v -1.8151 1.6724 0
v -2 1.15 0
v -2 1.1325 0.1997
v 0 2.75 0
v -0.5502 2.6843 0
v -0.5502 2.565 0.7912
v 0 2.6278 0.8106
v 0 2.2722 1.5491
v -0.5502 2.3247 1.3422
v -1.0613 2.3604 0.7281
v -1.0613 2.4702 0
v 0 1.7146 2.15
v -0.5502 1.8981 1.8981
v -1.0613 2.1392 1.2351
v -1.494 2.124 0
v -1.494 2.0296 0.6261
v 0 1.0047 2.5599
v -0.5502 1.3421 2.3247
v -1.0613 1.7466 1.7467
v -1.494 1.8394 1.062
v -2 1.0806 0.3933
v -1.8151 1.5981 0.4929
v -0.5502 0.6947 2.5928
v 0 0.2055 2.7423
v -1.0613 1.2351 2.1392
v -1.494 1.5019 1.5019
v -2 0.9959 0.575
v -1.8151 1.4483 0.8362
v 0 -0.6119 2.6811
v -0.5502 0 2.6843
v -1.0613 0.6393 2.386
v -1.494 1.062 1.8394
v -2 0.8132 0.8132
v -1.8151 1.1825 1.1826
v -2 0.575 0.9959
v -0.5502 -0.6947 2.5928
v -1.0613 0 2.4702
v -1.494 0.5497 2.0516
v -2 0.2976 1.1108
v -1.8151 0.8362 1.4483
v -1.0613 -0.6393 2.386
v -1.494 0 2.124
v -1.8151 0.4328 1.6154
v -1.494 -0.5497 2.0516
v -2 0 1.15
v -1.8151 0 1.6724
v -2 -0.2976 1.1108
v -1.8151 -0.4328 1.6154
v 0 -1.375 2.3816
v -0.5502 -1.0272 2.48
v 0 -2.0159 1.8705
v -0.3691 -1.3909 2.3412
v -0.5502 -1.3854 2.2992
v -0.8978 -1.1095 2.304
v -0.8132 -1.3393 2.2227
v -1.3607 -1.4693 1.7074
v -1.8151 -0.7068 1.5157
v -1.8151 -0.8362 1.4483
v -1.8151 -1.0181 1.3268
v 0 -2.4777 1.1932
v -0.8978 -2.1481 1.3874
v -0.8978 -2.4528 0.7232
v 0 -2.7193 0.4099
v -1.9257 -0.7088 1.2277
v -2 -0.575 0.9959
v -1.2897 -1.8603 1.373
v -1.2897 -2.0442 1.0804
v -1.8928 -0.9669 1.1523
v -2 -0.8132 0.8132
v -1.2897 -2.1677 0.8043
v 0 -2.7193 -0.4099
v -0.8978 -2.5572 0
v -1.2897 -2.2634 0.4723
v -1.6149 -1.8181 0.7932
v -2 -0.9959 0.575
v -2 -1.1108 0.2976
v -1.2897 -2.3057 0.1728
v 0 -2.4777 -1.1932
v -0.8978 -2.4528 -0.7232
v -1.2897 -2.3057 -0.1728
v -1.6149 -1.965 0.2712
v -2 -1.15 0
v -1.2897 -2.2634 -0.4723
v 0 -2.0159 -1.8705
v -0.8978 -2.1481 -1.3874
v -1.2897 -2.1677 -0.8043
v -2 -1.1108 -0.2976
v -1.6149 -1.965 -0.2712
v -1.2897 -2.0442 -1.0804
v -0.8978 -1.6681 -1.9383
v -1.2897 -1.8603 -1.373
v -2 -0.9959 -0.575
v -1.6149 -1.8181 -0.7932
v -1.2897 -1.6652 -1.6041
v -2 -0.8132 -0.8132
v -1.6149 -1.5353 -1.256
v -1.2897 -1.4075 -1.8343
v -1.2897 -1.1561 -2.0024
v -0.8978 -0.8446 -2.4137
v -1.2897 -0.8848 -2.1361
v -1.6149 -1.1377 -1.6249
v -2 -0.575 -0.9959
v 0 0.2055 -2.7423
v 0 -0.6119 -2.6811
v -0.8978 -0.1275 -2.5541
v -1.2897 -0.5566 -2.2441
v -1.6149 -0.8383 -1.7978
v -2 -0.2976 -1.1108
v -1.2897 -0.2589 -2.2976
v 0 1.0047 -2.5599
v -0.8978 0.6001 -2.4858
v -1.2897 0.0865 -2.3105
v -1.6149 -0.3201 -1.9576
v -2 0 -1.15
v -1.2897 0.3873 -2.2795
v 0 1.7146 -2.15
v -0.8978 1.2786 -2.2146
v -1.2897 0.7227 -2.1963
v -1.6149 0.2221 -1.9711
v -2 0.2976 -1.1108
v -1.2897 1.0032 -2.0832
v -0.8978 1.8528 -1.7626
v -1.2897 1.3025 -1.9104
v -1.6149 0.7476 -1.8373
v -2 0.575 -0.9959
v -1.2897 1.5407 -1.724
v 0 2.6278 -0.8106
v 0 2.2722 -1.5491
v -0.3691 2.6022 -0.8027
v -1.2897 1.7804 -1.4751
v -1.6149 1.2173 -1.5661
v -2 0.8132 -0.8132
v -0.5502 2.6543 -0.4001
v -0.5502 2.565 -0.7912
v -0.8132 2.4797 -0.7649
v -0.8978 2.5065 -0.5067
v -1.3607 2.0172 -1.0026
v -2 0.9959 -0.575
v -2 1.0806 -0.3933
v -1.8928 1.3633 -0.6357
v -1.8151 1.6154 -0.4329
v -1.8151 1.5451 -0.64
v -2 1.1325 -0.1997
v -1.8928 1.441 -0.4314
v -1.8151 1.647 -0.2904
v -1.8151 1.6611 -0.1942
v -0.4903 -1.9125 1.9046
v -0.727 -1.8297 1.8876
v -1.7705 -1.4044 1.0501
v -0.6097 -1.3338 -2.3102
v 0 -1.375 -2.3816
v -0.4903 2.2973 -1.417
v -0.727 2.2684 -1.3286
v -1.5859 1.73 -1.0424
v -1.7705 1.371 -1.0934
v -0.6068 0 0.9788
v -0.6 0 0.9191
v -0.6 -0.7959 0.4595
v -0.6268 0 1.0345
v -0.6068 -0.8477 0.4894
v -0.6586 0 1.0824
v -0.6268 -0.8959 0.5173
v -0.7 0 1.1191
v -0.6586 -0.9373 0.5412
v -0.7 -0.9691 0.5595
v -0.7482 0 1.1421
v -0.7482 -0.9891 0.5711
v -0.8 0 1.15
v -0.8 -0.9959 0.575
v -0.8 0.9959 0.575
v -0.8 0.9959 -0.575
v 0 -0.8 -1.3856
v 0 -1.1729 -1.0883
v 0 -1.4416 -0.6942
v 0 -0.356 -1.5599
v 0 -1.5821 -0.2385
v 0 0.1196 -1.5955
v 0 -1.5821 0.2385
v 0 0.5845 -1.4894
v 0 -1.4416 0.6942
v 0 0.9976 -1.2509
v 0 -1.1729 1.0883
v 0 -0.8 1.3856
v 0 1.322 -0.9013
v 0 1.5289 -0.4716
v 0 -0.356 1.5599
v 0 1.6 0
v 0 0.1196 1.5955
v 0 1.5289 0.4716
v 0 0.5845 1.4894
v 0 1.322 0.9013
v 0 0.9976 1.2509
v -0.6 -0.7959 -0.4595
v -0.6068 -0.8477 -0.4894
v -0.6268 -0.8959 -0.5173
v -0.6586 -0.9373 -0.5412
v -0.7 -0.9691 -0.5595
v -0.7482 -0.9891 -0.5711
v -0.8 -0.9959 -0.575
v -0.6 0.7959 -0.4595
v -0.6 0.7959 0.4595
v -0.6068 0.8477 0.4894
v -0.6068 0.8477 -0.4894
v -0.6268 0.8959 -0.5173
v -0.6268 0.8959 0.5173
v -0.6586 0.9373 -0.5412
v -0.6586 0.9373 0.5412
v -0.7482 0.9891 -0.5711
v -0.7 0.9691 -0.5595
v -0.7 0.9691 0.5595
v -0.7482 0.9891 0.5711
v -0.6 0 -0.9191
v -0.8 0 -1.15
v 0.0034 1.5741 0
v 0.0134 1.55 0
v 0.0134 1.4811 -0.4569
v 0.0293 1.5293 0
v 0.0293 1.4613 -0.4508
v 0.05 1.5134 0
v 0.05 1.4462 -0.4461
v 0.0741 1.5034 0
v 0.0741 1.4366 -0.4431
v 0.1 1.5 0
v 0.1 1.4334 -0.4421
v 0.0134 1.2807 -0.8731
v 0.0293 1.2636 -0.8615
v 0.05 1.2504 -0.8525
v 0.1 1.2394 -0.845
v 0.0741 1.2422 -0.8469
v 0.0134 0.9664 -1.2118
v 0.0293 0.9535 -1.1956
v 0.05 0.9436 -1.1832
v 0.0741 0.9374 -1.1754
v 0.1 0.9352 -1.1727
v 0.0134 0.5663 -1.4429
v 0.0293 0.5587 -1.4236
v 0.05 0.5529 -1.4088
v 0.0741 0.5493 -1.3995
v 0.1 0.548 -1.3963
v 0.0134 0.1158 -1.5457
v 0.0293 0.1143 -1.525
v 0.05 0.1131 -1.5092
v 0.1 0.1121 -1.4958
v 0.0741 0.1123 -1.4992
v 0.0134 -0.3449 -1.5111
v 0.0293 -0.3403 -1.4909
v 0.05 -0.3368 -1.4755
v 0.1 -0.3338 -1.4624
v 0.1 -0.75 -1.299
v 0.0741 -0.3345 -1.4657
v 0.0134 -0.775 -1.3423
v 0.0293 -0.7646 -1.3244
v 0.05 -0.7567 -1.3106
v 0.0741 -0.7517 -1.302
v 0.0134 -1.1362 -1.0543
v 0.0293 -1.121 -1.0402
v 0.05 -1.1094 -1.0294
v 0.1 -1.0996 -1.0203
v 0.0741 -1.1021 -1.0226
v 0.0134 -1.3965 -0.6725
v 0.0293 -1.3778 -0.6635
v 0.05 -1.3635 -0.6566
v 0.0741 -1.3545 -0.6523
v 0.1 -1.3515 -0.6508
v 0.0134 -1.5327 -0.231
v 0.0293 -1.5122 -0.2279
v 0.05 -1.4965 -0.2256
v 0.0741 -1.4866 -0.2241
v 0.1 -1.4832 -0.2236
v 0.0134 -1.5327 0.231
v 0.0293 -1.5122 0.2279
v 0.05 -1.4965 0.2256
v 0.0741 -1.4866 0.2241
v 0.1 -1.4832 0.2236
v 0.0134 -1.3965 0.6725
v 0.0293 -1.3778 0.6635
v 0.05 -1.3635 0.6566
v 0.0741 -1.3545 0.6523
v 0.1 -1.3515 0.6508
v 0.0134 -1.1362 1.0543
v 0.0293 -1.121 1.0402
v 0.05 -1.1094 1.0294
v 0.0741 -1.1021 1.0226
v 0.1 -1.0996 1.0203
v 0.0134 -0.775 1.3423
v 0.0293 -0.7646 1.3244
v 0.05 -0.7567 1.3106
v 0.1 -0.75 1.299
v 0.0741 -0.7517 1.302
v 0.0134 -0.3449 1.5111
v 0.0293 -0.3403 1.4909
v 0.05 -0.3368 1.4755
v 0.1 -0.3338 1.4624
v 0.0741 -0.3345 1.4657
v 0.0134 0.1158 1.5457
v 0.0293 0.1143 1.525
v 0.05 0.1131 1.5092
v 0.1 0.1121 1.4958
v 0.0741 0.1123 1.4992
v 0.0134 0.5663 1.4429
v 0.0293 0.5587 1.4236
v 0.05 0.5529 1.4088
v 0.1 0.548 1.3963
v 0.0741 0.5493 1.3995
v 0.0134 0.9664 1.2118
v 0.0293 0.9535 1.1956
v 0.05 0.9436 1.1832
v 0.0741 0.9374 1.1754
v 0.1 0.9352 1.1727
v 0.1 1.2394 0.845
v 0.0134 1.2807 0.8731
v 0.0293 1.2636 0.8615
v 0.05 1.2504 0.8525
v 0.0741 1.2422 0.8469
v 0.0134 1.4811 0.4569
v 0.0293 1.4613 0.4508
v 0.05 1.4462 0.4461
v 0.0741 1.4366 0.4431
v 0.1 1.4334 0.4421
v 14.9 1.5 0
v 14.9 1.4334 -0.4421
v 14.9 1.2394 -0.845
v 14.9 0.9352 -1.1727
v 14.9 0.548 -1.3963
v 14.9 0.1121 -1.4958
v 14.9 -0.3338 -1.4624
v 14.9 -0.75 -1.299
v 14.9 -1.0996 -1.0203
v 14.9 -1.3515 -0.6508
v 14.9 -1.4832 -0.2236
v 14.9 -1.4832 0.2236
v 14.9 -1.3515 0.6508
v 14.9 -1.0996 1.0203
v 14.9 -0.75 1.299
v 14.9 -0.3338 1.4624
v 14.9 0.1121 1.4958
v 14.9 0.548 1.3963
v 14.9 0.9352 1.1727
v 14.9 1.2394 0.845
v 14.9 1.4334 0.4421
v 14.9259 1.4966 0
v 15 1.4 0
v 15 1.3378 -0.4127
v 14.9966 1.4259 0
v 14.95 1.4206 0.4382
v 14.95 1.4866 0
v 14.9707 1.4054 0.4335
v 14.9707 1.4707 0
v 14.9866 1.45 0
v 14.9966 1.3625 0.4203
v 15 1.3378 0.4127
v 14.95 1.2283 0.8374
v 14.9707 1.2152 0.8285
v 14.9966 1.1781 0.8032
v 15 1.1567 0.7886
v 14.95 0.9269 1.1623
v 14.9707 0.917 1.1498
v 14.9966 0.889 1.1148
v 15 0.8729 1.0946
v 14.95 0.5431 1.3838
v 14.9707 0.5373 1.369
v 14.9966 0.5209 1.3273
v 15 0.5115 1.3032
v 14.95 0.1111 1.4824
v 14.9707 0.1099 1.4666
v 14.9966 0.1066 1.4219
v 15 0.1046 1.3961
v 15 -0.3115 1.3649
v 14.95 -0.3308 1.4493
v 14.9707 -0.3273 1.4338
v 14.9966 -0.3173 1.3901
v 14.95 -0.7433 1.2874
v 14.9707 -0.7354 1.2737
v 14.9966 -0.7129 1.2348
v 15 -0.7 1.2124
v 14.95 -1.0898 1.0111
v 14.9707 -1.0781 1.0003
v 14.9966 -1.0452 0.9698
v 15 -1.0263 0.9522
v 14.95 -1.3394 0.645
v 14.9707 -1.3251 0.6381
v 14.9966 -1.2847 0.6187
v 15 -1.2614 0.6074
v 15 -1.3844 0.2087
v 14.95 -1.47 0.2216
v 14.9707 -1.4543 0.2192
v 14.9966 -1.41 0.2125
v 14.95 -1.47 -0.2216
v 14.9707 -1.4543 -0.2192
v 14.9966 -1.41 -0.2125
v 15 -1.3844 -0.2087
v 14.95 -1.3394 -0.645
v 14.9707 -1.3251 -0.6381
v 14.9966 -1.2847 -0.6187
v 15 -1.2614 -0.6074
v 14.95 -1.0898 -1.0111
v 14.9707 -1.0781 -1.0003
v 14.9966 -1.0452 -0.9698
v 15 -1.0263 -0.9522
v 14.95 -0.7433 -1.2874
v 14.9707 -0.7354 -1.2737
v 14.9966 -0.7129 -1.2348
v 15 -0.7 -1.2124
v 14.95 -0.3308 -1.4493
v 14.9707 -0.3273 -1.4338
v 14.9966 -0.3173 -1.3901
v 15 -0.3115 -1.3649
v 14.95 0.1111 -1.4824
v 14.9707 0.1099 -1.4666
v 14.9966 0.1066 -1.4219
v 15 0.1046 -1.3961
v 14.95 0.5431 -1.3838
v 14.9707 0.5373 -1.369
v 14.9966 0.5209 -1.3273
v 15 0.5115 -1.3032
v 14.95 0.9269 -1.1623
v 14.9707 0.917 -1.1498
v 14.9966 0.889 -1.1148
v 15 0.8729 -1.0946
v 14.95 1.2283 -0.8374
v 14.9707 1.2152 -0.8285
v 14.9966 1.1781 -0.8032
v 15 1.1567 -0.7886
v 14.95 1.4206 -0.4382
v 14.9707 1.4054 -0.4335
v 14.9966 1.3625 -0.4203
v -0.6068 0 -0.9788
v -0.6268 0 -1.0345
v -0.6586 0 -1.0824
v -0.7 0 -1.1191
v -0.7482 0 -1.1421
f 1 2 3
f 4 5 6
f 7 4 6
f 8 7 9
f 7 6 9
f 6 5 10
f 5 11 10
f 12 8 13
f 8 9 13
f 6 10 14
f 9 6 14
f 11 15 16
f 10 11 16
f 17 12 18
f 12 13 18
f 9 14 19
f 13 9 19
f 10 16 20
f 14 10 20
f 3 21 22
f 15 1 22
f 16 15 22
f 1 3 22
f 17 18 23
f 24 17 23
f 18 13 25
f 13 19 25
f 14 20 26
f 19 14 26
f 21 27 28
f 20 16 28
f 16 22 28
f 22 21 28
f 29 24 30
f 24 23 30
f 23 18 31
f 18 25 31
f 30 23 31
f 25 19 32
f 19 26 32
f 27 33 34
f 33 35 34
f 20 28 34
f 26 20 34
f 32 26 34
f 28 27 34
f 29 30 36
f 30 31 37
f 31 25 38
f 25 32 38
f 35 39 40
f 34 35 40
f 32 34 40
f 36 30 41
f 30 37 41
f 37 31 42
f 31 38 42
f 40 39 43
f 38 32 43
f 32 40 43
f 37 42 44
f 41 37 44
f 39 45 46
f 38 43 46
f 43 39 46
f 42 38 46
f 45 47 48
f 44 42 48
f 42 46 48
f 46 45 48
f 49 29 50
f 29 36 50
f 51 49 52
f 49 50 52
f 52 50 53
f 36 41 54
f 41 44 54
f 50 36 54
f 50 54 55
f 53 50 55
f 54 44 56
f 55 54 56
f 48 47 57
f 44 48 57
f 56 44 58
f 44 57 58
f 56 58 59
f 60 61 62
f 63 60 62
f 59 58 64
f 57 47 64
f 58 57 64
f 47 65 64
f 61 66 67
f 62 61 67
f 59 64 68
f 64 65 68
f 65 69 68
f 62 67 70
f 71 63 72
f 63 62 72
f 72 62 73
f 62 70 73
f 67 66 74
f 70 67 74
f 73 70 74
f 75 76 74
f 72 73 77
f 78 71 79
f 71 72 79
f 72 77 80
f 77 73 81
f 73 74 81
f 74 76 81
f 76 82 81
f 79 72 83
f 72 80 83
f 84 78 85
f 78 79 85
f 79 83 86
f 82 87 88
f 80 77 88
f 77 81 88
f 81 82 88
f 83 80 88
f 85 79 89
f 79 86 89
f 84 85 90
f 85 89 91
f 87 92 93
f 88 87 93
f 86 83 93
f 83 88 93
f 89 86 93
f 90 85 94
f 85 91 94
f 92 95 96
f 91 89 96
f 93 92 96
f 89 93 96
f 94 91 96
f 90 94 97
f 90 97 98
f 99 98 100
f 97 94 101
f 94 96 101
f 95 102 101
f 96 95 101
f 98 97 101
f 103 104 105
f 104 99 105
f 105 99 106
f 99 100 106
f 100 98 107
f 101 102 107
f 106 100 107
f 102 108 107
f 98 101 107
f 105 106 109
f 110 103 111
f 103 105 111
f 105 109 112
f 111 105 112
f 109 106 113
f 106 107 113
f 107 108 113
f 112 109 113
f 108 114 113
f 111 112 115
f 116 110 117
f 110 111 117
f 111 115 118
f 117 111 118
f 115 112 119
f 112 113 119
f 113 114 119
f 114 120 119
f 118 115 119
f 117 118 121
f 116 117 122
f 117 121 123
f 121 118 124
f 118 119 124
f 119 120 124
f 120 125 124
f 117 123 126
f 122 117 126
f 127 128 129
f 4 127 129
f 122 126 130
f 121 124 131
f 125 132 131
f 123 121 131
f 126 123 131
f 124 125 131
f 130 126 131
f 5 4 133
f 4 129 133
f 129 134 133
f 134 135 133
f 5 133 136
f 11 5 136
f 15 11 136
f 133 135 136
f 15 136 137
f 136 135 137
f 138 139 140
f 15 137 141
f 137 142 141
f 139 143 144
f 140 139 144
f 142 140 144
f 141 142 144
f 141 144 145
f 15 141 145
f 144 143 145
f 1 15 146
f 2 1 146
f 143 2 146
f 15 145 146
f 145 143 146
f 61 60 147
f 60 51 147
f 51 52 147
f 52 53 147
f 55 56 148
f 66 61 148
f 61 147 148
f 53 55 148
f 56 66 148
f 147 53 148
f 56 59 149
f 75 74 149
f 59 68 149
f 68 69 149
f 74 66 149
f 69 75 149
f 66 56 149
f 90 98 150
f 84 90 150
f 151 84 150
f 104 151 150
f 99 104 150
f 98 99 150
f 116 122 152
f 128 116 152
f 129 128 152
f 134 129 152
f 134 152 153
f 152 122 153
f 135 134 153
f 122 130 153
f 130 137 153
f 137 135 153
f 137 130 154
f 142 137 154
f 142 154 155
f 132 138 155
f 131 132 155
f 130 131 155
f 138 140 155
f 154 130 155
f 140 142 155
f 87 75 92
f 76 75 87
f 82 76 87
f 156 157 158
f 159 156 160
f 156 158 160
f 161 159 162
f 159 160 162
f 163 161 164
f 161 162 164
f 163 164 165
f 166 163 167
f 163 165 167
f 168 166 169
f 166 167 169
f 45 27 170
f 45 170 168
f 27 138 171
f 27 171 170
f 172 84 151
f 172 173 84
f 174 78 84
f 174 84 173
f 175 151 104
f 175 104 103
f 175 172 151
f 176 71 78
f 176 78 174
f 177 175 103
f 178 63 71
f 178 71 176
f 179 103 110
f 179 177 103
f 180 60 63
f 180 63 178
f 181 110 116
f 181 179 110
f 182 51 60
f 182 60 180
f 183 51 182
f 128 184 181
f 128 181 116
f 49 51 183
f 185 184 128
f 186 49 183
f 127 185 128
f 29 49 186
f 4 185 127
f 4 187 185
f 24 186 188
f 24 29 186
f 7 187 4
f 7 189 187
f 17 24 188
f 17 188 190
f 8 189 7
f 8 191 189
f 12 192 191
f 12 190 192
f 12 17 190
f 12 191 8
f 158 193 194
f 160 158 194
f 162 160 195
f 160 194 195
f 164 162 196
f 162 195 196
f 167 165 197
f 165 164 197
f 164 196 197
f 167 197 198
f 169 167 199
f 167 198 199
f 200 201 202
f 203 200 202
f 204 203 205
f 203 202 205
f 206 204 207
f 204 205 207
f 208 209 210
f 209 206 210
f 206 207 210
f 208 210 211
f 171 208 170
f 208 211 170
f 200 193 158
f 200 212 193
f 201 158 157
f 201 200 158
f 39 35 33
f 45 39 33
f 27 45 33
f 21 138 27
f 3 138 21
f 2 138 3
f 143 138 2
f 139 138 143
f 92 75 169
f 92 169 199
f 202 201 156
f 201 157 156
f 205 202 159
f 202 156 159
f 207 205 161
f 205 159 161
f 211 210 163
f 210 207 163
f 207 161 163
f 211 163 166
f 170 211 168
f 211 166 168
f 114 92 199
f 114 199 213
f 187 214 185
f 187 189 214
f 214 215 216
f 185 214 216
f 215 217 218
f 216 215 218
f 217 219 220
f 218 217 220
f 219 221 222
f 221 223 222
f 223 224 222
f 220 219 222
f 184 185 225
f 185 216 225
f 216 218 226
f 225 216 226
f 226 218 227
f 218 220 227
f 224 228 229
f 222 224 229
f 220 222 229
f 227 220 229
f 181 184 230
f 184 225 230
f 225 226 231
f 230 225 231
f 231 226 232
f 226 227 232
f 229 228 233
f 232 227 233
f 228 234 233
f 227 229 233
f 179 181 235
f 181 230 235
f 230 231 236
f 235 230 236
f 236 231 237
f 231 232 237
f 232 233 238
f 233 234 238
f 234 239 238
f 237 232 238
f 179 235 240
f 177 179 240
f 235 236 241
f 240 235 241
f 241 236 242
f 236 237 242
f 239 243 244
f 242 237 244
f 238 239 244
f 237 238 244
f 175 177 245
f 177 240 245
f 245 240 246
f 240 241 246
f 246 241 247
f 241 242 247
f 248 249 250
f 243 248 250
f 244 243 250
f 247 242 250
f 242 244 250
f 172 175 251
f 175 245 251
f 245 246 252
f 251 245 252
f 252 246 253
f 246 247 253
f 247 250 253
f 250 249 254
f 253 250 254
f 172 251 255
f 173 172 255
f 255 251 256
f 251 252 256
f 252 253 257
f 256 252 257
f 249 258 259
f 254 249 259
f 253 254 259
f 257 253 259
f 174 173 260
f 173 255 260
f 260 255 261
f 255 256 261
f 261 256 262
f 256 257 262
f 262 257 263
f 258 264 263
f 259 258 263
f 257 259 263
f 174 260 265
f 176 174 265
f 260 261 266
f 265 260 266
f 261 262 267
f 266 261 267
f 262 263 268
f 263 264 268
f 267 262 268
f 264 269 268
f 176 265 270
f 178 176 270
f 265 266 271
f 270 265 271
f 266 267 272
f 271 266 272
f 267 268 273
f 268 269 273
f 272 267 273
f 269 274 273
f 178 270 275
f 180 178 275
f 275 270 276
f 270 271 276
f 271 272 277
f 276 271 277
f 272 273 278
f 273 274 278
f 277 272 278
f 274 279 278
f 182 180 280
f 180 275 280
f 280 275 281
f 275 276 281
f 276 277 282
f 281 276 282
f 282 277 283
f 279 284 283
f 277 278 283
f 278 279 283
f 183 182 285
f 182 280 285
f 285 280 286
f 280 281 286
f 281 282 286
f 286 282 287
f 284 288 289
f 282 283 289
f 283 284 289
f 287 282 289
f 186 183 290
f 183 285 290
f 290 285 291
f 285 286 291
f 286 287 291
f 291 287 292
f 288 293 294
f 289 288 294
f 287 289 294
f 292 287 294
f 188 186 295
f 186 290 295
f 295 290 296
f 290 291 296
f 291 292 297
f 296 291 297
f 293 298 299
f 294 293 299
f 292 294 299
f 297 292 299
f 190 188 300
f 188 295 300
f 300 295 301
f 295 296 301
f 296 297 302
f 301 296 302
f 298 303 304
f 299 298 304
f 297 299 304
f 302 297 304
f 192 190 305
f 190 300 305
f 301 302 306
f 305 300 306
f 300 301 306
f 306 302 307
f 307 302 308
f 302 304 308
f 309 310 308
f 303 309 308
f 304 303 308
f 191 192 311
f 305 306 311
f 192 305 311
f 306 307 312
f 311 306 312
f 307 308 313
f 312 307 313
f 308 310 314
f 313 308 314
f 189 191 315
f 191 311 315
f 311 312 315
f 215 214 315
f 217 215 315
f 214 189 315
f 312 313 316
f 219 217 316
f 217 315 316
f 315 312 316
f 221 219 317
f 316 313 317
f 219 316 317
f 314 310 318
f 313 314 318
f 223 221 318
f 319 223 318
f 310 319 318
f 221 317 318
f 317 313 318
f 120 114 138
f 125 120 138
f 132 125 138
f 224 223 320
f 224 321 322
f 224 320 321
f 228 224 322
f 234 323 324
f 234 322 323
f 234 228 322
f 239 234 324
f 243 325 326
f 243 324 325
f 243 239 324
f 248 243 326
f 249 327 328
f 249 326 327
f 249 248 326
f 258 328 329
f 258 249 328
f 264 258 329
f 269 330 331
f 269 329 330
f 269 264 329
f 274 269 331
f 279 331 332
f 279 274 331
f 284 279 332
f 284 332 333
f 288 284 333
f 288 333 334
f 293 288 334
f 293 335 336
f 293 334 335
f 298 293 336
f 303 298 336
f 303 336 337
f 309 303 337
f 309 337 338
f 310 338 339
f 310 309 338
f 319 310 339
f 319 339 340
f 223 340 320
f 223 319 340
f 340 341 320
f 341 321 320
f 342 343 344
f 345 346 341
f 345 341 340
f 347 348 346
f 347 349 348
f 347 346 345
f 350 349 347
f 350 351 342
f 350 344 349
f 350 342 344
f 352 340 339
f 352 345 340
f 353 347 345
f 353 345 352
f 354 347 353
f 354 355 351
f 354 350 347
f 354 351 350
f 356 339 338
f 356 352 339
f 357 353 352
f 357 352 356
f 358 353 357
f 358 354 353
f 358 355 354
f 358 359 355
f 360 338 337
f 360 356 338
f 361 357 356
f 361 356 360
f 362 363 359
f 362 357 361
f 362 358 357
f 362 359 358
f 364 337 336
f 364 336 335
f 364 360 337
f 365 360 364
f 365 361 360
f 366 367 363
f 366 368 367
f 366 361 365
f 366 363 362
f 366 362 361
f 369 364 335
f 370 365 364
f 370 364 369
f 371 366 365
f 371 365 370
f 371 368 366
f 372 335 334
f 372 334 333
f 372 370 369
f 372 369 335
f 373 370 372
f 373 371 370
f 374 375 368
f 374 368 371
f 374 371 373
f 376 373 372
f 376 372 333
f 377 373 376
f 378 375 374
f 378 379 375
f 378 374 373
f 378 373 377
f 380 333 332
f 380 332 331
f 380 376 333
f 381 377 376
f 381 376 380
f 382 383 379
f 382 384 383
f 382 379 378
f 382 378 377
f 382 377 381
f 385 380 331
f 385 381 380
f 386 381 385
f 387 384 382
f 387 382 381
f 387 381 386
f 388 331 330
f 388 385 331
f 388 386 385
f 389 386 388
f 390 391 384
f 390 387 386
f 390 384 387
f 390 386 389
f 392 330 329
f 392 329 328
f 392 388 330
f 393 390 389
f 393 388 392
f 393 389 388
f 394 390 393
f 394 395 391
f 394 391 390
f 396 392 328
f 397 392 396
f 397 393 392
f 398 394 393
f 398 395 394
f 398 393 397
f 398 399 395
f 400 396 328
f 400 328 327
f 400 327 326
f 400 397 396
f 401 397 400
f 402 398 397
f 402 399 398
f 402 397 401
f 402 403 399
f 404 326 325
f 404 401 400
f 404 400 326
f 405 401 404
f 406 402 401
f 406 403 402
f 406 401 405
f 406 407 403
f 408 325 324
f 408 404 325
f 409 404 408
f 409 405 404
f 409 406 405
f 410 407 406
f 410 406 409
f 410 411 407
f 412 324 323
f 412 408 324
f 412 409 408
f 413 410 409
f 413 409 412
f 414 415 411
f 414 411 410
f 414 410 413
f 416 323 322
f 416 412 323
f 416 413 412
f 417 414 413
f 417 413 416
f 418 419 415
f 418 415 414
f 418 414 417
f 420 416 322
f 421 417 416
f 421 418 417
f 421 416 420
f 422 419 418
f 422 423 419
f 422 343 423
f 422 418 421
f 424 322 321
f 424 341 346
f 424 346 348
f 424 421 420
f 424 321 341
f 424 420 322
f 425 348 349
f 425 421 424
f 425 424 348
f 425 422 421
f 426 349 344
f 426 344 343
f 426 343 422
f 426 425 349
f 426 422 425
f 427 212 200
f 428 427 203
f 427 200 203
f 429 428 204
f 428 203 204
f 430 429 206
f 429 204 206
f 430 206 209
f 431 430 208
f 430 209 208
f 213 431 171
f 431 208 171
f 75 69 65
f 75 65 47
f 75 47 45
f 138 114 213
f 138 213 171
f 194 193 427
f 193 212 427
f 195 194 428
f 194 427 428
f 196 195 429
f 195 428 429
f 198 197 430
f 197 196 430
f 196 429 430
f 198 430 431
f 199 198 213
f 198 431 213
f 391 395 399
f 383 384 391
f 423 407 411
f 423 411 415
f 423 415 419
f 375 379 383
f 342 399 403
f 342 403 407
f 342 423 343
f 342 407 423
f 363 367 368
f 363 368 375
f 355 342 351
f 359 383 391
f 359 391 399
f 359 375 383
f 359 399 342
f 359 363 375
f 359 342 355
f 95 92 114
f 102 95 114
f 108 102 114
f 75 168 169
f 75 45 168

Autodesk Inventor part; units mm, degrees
ref_plane "YZ Plane" through (0, 0, 0) normal (1, 0, 0) x (0, 1, 0)
ref_plane "XZ Plane" through (0, 0, 0) normal (0, 1, 0) x (-1, 0, 0)
ref_plane "XY Plane" through (0, 0, 0) normal (0, 0, 1) x (1, 0, 0)
sketch "スケッチ1" plane through (0, 0, 0) normal (0, 0, 1) x (1, 0, 0)
  line L0 (0, 0) -> (15, 0)
  line L1 (15, 0) -> (15, 1.5)
  line L2 (15, 1.5) -> (0, 1.5)
  line L3 (0, 1.5) -> (0, 0)
  line L4 (0, 0) -> (0, 2.75)
  line L5 (0, 0) -> (-2, 0)
  line L6 (-2, 0) -> (0, 0)
  line L7 (-2, 0) -> (-2, 1.15)
  arc A0 (0, 2.75) -> (-2, 1.15) centre (-0.0403, 0.7504) ccw
  dimension "d0" = 1.5
  dimension "d1" = 15
  dimension "d3" = 2
  dimension "d4" = 2.75
  dimension "d5" = 1.15
  dimension "d6" = 2
revolve "回転1" add sketch "スケッチ1" angle 360 about axis through (-2, 0, 0) along (1, 0, 0)
thread "ねじ1" size "M3x0.5" class "6g" standard "ANSI Metric M Profile" length 100
sketch "スケッチ2" plane through (-2, 0, 0) normal (-1, 0, 0) x (0, 0, 1)
  circle A0 centre (0, 0) radius 1.15 projected
  line L0 (-0.575, 0.9959) -> (0.575, 0.9959)
  line L1 (0.575, 0.9959) -> (1.15, 0)
  line L2 (1.15, 0) -> (0.575, -0.9959)
  line L3 (0.575, -0.9959) -> (-0.575, -0.9959)
  line L4 (-0.575, -0.9959) -> (-1.15, 0)
  line L5 (-1.15, 0) -> (-0.575, 0.9959)
  dimension "d10" = 1.15
  dimension "d11" = 1.9919
extrude "押し出し1" cut sketch "スケッチ2" against normal blind 1.4 contours L2 L3 L4 L5 L0 L1
fillet "フィレット1" radius 0.2 6 edges at (-0.6, 0.9959, 0) (-0.6, 0.498, 0.8625) (-0.6, 0.498, -0.8625) (-0.6, -0.498, -0.8625) (-0.6, -0.9959, 0) (-0.6, -0.498, 0.8625)
fillet "フィレット2" radius 0.1 1 edges at (0, -1.5, 0)
fillet "フィレット3" radius 0.1 1 edges at (15, -1.5, 0)
properties part number "ネジボタンM3L15" material "鋼"
